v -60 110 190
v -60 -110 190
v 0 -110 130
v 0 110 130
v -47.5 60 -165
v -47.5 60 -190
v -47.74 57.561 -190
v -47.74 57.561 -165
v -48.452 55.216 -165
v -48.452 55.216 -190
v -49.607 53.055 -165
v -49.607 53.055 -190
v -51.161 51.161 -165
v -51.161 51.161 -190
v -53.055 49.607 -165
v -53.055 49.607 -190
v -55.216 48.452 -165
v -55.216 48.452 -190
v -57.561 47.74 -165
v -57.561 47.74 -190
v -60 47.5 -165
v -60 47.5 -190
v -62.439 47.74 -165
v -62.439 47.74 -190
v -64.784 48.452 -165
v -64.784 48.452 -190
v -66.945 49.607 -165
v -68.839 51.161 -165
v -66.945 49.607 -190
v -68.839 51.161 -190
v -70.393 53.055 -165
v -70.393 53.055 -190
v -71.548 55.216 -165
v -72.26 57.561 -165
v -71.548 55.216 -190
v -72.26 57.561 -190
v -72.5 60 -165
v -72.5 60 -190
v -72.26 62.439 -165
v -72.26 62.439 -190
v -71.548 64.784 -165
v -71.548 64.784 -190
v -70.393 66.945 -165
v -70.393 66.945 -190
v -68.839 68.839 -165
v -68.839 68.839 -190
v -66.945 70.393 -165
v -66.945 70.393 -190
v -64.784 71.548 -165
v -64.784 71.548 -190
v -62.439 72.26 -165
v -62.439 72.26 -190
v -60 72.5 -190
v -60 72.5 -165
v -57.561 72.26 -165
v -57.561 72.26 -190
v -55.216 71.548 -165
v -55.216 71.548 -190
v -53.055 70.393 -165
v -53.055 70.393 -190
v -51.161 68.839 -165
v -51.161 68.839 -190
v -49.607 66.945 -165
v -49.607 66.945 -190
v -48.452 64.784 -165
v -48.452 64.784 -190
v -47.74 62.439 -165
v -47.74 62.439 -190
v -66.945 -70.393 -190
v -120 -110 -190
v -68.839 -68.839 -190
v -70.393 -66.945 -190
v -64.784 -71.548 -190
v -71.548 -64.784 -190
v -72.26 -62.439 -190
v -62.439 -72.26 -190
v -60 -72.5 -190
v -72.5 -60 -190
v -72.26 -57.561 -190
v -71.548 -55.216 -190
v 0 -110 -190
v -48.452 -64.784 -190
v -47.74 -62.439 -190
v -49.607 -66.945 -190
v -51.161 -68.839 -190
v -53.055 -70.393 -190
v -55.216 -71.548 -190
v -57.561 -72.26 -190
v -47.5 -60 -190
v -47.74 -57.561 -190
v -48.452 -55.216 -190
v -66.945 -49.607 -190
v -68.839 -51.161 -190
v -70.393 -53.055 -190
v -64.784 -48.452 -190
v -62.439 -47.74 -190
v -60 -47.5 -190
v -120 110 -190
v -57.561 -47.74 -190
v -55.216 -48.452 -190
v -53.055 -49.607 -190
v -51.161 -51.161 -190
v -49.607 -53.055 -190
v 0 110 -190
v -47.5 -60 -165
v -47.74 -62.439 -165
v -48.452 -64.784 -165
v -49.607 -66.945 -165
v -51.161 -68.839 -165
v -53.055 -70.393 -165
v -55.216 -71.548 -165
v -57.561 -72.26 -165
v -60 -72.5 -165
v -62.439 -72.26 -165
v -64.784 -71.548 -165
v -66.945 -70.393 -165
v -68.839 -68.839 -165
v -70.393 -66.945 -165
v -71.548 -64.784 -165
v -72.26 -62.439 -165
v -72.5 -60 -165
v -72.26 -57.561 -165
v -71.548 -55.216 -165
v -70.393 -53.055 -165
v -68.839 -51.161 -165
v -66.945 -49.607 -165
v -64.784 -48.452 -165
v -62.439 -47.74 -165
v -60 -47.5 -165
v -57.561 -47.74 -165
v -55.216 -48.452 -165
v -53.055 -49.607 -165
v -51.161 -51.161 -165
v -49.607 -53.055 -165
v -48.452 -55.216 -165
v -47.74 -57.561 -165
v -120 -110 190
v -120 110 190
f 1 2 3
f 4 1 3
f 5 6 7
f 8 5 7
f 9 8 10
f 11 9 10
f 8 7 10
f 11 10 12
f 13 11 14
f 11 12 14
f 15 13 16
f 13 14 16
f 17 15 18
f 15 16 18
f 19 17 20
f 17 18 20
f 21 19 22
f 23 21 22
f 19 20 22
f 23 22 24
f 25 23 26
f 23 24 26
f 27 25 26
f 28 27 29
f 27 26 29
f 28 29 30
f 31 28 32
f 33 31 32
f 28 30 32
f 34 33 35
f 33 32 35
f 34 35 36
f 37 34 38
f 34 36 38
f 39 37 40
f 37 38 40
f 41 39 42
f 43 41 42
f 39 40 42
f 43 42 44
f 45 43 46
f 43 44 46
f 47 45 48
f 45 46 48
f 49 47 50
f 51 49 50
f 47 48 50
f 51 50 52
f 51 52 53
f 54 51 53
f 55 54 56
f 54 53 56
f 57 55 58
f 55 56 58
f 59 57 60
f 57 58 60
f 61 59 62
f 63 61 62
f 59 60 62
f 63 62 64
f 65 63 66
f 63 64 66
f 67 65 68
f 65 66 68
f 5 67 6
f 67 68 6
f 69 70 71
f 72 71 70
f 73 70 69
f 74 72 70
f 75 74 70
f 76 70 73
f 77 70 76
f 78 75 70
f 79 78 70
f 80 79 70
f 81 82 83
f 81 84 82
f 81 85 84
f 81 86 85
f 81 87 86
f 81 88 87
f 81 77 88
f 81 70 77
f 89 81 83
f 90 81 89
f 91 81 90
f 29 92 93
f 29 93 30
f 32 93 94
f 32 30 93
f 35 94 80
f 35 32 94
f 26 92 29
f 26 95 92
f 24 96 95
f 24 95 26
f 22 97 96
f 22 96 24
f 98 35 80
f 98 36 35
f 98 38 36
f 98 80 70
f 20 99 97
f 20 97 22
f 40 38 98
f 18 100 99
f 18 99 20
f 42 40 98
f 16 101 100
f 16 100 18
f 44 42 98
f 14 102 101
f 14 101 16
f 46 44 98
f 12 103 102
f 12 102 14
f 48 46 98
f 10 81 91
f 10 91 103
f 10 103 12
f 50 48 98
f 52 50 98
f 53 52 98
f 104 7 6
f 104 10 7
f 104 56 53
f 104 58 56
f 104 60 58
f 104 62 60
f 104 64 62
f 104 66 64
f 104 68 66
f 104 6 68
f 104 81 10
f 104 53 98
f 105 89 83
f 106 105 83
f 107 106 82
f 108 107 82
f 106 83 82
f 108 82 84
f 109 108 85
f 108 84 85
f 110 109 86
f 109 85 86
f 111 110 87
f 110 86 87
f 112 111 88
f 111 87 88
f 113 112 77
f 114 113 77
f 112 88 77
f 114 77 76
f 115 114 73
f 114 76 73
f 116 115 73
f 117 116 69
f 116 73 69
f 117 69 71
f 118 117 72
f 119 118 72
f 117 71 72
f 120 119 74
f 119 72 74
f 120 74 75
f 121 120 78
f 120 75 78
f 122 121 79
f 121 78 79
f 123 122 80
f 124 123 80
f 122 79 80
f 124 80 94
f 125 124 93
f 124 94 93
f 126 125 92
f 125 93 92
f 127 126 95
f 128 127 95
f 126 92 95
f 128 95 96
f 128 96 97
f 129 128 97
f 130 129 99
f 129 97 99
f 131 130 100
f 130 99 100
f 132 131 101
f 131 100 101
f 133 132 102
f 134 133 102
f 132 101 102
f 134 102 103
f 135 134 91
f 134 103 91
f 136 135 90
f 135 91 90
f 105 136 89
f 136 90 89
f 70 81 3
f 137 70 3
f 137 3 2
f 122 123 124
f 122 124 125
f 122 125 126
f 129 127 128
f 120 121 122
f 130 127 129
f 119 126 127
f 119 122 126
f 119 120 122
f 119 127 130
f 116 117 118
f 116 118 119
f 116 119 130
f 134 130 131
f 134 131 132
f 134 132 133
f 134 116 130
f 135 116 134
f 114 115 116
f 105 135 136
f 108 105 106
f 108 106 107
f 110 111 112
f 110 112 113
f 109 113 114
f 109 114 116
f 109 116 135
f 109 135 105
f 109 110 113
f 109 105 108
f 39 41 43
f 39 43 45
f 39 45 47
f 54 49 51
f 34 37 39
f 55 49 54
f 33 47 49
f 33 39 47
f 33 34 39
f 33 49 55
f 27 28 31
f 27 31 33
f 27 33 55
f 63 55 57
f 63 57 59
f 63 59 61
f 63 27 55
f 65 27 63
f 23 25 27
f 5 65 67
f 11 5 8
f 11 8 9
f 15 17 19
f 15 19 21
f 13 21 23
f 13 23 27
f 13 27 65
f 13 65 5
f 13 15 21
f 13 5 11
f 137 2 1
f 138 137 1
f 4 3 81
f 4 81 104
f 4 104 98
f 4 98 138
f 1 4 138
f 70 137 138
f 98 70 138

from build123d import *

# Parameters (mm, degrees)
F0_W     = 220
F0_H     = 380
F1_DEPTH = 120
F3_DEPTH = 220
F4_R     = 12.5
F5_DEPTH = 25


with BuildPart() as f1:
    # F0 (on Right) → F1 (new body)
    with BuildSketch(Plane.YZ):
        Rectangle(F0_W, F0_H)
    extrude(amount=-F1_DEPTH)

    # F2 (on face) → F3 (cut)
    with BuildSketch(Plane.XZ.offset(110)):
        Polygon((0, 190), (-60, 190), (0, 130), align=None)
    extrude(amount=-F3_DEPTH, mode=Mode.SUBTRACT)

    # F4 (on face) → F5 (cut)
    with BuildSketch(Plane(origin=(0, 0, -190), x_dir=(1, 0, 0), z_dir=(0, 0, -1))):
        with Locations((-60, 60)):
            Circle(F4_R)
        with Locations((-60, -60)):
            Circle(F4_R)
    extrude(amount=-F5_DEPTH, mode=Mode.SUBTRACT)


solid = f1.part
